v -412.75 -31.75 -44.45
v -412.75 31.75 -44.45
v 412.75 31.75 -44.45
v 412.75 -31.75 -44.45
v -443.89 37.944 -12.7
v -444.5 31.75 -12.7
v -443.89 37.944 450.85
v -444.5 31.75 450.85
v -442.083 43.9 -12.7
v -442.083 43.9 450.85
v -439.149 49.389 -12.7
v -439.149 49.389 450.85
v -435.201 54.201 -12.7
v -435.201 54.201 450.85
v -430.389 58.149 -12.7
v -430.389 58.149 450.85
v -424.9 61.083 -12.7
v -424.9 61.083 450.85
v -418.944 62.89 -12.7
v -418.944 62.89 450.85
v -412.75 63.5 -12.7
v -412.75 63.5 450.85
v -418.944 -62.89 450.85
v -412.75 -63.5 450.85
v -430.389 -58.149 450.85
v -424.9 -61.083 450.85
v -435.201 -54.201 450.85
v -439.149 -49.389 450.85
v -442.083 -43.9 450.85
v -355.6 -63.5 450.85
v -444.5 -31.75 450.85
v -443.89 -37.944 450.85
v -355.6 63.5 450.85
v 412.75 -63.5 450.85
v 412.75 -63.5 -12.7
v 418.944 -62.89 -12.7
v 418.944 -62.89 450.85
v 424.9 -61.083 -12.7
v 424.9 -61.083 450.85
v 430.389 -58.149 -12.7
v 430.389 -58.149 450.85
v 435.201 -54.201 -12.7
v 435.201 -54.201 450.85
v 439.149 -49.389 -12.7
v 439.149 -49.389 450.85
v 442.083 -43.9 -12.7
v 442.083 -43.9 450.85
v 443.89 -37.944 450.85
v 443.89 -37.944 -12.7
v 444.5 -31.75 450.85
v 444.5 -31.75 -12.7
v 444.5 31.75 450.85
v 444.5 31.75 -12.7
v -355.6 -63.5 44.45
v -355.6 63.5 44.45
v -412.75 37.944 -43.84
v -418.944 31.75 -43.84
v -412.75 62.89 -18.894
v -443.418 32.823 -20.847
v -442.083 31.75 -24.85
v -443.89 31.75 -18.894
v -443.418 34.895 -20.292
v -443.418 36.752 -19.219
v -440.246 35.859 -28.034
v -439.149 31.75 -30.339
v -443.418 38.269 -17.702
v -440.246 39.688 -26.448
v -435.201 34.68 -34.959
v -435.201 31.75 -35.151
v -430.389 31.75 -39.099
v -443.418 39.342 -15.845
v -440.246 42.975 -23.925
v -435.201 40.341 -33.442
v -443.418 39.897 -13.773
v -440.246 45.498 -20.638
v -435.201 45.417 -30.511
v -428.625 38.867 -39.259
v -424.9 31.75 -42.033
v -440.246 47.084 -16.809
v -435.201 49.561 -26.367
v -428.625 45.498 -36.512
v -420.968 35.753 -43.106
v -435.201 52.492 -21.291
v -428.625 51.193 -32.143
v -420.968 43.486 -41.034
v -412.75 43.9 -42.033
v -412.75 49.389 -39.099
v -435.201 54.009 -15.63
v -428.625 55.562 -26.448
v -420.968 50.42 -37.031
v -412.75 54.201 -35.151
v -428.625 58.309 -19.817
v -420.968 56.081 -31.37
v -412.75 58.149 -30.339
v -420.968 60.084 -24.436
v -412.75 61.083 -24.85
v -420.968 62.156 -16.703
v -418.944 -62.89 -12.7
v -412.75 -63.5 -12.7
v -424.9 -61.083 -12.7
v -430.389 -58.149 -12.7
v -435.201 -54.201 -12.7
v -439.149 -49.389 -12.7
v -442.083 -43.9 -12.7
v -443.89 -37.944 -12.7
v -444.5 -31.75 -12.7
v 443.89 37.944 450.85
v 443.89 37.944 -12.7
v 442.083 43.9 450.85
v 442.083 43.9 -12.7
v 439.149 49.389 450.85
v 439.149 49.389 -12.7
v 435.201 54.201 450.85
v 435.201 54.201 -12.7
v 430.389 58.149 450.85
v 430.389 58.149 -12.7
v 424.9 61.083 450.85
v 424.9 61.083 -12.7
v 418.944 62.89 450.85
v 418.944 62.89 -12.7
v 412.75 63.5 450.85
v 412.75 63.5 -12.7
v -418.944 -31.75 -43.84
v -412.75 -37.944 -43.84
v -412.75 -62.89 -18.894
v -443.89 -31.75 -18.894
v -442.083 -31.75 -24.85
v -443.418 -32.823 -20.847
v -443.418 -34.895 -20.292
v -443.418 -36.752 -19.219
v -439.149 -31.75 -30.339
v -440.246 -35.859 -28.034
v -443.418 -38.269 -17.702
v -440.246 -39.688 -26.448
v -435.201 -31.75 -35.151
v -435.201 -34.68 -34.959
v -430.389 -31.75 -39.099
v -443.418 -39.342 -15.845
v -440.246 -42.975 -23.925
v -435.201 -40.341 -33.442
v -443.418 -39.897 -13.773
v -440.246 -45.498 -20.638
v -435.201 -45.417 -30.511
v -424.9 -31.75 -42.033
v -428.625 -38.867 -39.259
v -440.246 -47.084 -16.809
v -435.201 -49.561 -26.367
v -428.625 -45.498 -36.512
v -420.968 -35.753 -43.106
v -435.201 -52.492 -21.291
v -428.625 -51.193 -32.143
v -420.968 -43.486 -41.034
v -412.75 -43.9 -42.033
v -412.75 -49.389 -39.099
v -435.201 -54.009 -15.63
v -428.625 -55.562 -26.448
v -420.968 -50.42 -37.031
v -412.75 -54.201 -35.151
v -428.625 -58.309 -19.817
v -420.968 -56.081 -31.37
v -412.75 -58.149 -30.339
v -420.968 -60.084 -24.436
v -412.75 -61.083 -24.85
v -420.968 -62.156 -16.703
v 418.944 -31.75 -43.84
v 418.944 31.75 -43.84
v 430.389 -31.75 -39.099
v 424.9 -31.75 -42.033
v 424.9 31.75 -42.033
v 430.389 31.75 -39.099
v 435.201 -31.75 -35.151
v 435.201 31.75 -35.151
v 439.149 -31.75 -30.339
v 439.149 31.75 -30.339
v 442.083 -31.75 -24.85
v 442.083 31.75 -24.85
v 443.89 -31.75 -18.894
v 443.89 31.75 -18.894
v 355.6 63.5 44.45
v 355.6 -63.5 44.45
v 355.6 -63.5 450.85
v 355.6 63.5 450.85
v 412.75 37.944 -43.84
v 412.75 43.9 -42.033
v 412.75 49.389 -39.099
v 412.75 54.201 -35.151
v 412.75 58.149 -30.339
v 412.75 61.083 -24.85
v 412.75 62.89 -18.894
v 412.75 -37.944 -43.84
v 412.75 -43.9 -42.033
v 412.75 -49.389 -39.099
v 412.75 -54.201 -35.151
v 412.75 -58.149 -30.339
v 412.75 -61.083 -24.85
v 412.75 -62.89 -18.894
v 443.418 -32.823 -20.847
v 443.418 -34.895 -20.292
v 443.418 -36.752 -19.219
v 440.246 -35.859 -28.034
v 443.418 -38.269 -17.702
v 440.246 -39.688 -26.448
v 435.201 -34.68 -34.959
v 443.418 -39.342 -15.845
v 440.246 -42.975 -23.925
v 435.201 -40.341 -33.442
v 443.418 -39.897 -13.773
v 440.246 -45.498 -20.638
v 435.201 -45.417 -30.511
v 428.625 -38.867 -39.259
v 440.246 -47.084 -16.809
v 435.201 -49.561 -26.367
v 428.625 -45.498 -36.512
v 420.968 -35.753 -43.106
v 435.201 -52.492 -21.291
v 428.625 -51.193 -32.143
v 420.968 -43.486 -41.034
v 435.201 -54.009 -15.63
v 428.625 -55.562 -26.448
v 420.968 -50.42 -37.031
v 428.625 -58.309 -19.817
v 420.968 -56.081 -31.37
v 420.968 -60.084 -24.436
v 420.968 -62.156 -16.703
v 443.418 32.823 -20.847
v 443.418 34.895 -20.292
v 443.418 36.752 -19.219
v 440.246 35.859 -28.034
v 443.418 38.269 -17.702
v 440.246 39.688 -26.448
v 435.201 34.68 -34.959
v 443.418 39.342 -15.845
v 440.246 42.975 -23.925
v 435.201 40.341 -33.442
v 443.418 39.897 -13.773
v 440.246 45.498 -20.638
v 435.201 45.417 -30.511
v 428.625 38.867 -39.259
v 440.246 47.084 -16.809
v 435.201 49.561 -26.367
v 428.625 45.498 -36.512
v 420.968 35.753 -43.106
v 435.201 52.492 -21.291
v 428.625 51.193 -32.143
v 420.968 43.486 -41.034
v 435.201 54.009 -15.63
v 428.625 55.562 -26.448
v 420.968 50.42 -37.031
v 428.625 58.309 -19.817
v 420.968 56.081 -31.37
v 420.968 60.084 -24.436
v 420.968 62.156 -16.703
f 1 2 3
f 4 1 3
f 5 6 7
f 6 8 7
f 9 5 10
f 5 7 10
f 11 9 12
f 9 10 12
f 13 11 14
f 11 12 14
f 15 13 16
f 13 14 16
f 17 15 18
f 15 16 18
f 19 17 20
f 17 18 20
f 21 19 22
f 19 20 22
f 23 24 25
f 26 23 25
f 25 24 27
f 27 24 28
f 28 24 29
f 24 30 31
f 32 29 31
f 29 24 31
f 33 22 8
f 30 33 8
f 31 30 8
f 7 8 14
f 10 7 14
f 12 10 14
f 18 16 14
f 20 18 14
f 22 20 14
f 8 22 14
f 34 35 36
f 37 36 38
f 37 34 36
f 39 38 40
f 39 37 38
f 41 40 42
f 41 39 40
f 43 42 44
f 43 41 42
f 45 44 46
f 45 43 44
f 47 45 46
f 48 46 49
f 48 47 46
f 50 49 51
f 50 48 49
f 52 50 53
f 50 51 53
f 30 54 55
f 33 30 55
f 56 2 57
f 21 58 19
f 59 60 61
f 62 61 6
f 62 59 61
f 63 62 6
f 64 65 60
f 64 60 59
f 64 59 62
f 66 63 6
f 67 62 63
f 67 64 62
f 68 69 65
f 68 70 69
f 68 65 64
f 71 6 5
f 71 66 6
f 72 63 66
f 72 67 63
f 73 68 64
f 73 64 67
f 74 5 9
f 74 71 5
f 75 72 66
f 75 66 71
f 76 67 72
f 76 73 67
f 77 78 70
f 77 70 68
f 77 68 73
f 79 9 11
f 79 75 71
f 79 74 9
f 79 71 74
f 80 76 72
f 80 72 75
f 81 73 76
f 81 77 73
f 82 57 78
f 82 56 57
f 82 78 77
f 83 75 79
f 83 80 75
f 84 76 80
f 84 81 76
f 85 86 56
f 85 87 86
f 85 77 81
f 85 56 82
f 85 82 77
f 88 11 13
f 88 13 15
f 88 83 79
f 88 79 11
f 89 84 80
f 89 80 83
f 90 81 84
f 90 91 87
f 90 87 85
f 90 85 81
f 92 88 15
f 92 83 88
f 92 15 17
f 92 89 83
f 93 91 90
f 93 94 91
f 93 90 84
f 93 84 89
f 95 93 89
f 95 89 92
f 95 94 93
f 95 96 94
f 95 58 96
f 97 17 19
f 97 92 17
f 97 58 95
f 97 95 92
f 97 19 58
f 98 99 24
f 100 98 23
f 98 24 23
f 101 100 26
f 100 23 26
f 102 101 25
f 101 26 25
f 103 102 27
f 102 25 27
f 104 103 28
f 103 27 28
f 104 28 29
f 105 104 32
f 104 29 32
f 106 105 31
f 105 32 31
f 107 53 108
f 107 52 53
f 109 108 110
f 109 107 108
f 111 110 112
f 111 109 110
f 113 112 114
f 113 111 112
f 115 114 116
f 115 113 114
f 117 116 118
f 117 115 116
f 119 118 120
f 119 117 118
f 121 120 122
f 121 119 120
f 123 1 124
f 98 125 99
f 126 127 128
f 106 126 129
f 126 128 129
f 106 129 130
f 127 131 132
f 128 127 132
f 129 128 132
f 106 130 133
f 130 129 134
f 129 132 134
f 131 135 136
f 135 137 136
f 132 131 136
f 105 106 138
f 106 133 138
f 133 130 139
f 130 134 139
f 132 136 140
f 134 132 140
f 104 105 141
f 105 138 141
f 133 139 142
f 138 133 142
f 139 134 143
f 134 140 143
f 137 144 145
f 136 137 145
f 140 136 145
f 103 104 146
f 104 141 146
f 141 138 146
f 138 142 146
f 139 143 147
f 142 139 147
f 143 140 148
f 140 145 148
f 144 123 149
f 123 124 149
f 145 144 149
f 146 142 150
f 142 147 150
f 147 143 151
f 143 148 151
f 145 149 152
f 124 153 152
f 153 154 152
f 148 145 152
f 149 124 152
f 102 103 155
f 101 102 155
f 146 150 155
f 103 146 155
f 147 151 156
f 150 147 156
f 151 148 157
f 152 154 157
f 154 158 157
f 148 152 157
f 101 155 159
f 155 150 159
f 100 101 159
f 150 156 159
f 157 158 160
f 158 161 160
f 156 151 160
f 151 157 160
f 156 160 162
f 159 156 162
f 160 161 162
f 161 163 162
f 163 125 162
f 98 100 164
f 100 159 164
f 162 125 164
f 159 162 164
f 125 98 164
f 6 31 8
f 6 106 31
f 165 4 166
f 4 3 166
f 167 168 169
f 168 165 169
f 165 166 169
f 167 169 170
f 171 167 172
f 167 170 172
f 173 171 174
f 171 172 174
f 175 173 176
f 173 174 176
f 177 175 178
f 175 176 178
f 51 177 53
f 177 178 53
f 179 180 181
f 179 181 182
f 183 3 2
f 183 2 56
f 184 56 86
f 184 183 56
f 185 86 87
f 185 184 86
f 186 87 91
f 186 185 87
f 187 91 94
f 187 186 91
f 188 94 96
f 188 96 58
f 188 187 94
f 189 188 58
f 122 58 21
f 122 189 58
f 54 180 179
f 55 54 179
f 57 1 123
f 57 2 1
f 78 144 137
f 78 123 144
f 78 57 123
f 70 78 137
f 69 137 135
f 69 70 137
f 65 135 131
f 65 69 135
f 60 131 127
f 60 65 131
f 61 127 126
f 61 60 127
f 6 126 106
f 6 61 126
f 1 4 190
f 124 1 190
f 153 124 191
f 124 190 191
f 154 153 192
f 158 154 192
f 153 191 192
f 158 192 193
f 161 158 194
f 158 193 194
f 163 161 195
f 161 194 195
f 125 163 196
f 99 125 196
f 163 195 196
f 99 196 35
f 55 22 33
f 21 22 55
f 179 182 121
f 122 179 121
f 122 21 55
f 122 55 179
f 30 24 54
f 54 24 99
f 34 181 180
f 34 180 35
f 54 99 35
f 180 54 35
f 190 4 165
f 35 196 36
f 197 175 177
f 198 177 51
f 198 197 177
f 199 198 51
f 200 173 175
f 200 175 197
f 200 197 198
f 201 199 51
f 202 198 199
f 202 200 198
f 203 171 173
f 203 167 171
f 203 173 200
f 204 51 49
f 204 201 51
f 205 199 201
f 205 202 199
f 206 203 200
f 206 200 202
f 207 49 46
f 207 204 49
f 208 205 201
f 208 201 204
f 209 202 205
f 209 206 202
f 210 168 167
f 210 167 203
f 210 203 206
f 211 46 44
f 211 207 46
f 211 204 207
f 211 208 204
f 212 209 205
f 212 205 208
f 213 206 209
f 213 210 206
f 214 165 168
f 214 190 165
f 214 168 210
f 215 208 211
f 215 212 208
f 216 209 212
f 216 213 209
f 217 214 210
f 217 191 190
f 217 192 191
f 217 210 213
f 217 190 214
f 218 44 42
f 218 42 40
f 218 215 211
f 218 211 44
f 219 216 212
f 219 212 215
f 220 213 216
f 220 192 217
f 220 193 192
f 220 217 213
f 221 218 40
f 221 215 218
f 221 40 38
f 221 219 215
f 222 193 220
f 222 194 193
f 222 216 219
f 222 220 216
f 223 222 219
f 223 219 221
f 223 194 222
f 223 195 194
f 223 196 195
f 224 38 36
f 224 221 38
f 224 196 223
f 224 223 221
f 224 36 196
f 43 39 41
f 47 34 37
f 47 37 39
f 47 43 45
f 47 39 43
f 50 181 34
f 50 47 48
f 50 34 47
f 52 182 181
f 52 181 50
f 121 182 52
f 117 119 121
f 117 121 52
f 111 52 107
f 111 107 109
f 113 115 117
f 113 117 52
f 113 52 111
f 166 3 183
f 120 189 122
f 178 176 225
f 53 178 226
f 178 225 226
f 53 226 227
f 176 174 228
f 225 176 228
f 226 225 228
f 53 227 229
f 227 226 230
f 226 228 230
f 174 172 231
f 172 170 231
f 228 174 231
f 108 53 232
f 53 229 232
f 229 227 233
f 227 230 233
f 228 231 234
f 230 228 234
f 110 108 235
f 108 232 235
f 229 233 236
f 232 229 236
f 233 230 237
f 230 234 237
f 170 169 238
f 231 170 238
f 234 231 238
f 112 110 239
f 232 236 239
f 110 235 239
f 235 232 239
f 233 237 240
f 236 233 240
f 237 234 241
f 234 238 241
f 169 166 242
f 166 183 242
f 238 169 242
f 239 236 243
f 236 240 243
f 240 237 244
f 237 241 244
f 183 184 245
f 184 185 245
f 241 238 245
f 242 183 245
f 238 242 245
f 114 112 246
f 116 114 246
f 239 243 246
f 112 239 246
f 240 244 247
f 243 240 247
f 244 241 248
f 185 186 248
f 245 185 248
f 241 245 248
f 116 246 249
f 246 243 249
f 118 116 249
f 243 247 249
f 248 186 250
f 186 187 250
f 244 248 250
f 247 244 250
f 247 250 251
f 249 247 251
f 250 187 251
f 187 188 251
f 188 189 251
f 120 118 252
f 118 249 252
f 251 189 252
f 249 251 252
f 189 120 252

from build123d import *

# Parameters (mm, degrees)
SKETCH1_W           = 88.9
SKETCH1_H           = 127
BOSS_EXTRUDE1_DEPTH = 355.6
FILLET1_R           = 31.75
SKETCH3_W           = 88.9
SKETCH3_H           = 127
BOSS_EXTRUDE2_DEPTH = 495.3
FILLET2_R           = 31.75


# Read off the part's stored shape, not the designer's step: Mirror1
with BuildPart() as part:
    # Sketch1 → Boss-Extrude1 (new, symmetric)
    with BuildSketch(Plane(origin=(0, 0, 0), x_dir=(0, 0, -1), z_dir=(1, 0, 0))):
        Rectangle(SKETCH1_W, SKETCH1_H)
    extrude(amount=BOSS_EXTRUDE1_DEPTH, both=True)

    # Fillet1
    fillet1_edges = [part.edges().sort_by_distance(p)[0] for p in [
        (0, -63.5, -44.45),
        (0, 63.5, -44.45),
    ]]
    fillet(fillet1_edges, radius=FILLET1_R)

    # Sketch3 → Boss-Extrude2 (add)
    with BuildSketch(Plane(origin=(0, 0, -44.45), x_dir=(-1, 0, 0), z_dir=(0, 0, -1))):
        with Locations((400.05, 0)):
            Rectangle(SKETCH3_W, SKETCH3_H)
    extrude(amount=-BOSS_EXTRUDE2_DEPTH)

    # Fillet2
    fillet2_edges = [part.edges().sort_by_distance(p)[0] for p in [
        (-400.05, -63.5, -44.45),
        (-400.05, 63.5, -44.45),
        (-444.5, 0, -44.45),
        (-444.5, -63.5, 203.2),
        (-444.5, 63.5, 203.2),
    ]]
    fillet(fillet2_edges, radius=FILLET2_R)

    # Mirror1: part across plane


with BuildPart() as part_1:
    add(part.part)
    add(part.part.mirror(Plane(origin=(0, 0, 0), x_dir=(0, 0, 1), z_dir=(1, 0, 0))))


solid = part_1.part
